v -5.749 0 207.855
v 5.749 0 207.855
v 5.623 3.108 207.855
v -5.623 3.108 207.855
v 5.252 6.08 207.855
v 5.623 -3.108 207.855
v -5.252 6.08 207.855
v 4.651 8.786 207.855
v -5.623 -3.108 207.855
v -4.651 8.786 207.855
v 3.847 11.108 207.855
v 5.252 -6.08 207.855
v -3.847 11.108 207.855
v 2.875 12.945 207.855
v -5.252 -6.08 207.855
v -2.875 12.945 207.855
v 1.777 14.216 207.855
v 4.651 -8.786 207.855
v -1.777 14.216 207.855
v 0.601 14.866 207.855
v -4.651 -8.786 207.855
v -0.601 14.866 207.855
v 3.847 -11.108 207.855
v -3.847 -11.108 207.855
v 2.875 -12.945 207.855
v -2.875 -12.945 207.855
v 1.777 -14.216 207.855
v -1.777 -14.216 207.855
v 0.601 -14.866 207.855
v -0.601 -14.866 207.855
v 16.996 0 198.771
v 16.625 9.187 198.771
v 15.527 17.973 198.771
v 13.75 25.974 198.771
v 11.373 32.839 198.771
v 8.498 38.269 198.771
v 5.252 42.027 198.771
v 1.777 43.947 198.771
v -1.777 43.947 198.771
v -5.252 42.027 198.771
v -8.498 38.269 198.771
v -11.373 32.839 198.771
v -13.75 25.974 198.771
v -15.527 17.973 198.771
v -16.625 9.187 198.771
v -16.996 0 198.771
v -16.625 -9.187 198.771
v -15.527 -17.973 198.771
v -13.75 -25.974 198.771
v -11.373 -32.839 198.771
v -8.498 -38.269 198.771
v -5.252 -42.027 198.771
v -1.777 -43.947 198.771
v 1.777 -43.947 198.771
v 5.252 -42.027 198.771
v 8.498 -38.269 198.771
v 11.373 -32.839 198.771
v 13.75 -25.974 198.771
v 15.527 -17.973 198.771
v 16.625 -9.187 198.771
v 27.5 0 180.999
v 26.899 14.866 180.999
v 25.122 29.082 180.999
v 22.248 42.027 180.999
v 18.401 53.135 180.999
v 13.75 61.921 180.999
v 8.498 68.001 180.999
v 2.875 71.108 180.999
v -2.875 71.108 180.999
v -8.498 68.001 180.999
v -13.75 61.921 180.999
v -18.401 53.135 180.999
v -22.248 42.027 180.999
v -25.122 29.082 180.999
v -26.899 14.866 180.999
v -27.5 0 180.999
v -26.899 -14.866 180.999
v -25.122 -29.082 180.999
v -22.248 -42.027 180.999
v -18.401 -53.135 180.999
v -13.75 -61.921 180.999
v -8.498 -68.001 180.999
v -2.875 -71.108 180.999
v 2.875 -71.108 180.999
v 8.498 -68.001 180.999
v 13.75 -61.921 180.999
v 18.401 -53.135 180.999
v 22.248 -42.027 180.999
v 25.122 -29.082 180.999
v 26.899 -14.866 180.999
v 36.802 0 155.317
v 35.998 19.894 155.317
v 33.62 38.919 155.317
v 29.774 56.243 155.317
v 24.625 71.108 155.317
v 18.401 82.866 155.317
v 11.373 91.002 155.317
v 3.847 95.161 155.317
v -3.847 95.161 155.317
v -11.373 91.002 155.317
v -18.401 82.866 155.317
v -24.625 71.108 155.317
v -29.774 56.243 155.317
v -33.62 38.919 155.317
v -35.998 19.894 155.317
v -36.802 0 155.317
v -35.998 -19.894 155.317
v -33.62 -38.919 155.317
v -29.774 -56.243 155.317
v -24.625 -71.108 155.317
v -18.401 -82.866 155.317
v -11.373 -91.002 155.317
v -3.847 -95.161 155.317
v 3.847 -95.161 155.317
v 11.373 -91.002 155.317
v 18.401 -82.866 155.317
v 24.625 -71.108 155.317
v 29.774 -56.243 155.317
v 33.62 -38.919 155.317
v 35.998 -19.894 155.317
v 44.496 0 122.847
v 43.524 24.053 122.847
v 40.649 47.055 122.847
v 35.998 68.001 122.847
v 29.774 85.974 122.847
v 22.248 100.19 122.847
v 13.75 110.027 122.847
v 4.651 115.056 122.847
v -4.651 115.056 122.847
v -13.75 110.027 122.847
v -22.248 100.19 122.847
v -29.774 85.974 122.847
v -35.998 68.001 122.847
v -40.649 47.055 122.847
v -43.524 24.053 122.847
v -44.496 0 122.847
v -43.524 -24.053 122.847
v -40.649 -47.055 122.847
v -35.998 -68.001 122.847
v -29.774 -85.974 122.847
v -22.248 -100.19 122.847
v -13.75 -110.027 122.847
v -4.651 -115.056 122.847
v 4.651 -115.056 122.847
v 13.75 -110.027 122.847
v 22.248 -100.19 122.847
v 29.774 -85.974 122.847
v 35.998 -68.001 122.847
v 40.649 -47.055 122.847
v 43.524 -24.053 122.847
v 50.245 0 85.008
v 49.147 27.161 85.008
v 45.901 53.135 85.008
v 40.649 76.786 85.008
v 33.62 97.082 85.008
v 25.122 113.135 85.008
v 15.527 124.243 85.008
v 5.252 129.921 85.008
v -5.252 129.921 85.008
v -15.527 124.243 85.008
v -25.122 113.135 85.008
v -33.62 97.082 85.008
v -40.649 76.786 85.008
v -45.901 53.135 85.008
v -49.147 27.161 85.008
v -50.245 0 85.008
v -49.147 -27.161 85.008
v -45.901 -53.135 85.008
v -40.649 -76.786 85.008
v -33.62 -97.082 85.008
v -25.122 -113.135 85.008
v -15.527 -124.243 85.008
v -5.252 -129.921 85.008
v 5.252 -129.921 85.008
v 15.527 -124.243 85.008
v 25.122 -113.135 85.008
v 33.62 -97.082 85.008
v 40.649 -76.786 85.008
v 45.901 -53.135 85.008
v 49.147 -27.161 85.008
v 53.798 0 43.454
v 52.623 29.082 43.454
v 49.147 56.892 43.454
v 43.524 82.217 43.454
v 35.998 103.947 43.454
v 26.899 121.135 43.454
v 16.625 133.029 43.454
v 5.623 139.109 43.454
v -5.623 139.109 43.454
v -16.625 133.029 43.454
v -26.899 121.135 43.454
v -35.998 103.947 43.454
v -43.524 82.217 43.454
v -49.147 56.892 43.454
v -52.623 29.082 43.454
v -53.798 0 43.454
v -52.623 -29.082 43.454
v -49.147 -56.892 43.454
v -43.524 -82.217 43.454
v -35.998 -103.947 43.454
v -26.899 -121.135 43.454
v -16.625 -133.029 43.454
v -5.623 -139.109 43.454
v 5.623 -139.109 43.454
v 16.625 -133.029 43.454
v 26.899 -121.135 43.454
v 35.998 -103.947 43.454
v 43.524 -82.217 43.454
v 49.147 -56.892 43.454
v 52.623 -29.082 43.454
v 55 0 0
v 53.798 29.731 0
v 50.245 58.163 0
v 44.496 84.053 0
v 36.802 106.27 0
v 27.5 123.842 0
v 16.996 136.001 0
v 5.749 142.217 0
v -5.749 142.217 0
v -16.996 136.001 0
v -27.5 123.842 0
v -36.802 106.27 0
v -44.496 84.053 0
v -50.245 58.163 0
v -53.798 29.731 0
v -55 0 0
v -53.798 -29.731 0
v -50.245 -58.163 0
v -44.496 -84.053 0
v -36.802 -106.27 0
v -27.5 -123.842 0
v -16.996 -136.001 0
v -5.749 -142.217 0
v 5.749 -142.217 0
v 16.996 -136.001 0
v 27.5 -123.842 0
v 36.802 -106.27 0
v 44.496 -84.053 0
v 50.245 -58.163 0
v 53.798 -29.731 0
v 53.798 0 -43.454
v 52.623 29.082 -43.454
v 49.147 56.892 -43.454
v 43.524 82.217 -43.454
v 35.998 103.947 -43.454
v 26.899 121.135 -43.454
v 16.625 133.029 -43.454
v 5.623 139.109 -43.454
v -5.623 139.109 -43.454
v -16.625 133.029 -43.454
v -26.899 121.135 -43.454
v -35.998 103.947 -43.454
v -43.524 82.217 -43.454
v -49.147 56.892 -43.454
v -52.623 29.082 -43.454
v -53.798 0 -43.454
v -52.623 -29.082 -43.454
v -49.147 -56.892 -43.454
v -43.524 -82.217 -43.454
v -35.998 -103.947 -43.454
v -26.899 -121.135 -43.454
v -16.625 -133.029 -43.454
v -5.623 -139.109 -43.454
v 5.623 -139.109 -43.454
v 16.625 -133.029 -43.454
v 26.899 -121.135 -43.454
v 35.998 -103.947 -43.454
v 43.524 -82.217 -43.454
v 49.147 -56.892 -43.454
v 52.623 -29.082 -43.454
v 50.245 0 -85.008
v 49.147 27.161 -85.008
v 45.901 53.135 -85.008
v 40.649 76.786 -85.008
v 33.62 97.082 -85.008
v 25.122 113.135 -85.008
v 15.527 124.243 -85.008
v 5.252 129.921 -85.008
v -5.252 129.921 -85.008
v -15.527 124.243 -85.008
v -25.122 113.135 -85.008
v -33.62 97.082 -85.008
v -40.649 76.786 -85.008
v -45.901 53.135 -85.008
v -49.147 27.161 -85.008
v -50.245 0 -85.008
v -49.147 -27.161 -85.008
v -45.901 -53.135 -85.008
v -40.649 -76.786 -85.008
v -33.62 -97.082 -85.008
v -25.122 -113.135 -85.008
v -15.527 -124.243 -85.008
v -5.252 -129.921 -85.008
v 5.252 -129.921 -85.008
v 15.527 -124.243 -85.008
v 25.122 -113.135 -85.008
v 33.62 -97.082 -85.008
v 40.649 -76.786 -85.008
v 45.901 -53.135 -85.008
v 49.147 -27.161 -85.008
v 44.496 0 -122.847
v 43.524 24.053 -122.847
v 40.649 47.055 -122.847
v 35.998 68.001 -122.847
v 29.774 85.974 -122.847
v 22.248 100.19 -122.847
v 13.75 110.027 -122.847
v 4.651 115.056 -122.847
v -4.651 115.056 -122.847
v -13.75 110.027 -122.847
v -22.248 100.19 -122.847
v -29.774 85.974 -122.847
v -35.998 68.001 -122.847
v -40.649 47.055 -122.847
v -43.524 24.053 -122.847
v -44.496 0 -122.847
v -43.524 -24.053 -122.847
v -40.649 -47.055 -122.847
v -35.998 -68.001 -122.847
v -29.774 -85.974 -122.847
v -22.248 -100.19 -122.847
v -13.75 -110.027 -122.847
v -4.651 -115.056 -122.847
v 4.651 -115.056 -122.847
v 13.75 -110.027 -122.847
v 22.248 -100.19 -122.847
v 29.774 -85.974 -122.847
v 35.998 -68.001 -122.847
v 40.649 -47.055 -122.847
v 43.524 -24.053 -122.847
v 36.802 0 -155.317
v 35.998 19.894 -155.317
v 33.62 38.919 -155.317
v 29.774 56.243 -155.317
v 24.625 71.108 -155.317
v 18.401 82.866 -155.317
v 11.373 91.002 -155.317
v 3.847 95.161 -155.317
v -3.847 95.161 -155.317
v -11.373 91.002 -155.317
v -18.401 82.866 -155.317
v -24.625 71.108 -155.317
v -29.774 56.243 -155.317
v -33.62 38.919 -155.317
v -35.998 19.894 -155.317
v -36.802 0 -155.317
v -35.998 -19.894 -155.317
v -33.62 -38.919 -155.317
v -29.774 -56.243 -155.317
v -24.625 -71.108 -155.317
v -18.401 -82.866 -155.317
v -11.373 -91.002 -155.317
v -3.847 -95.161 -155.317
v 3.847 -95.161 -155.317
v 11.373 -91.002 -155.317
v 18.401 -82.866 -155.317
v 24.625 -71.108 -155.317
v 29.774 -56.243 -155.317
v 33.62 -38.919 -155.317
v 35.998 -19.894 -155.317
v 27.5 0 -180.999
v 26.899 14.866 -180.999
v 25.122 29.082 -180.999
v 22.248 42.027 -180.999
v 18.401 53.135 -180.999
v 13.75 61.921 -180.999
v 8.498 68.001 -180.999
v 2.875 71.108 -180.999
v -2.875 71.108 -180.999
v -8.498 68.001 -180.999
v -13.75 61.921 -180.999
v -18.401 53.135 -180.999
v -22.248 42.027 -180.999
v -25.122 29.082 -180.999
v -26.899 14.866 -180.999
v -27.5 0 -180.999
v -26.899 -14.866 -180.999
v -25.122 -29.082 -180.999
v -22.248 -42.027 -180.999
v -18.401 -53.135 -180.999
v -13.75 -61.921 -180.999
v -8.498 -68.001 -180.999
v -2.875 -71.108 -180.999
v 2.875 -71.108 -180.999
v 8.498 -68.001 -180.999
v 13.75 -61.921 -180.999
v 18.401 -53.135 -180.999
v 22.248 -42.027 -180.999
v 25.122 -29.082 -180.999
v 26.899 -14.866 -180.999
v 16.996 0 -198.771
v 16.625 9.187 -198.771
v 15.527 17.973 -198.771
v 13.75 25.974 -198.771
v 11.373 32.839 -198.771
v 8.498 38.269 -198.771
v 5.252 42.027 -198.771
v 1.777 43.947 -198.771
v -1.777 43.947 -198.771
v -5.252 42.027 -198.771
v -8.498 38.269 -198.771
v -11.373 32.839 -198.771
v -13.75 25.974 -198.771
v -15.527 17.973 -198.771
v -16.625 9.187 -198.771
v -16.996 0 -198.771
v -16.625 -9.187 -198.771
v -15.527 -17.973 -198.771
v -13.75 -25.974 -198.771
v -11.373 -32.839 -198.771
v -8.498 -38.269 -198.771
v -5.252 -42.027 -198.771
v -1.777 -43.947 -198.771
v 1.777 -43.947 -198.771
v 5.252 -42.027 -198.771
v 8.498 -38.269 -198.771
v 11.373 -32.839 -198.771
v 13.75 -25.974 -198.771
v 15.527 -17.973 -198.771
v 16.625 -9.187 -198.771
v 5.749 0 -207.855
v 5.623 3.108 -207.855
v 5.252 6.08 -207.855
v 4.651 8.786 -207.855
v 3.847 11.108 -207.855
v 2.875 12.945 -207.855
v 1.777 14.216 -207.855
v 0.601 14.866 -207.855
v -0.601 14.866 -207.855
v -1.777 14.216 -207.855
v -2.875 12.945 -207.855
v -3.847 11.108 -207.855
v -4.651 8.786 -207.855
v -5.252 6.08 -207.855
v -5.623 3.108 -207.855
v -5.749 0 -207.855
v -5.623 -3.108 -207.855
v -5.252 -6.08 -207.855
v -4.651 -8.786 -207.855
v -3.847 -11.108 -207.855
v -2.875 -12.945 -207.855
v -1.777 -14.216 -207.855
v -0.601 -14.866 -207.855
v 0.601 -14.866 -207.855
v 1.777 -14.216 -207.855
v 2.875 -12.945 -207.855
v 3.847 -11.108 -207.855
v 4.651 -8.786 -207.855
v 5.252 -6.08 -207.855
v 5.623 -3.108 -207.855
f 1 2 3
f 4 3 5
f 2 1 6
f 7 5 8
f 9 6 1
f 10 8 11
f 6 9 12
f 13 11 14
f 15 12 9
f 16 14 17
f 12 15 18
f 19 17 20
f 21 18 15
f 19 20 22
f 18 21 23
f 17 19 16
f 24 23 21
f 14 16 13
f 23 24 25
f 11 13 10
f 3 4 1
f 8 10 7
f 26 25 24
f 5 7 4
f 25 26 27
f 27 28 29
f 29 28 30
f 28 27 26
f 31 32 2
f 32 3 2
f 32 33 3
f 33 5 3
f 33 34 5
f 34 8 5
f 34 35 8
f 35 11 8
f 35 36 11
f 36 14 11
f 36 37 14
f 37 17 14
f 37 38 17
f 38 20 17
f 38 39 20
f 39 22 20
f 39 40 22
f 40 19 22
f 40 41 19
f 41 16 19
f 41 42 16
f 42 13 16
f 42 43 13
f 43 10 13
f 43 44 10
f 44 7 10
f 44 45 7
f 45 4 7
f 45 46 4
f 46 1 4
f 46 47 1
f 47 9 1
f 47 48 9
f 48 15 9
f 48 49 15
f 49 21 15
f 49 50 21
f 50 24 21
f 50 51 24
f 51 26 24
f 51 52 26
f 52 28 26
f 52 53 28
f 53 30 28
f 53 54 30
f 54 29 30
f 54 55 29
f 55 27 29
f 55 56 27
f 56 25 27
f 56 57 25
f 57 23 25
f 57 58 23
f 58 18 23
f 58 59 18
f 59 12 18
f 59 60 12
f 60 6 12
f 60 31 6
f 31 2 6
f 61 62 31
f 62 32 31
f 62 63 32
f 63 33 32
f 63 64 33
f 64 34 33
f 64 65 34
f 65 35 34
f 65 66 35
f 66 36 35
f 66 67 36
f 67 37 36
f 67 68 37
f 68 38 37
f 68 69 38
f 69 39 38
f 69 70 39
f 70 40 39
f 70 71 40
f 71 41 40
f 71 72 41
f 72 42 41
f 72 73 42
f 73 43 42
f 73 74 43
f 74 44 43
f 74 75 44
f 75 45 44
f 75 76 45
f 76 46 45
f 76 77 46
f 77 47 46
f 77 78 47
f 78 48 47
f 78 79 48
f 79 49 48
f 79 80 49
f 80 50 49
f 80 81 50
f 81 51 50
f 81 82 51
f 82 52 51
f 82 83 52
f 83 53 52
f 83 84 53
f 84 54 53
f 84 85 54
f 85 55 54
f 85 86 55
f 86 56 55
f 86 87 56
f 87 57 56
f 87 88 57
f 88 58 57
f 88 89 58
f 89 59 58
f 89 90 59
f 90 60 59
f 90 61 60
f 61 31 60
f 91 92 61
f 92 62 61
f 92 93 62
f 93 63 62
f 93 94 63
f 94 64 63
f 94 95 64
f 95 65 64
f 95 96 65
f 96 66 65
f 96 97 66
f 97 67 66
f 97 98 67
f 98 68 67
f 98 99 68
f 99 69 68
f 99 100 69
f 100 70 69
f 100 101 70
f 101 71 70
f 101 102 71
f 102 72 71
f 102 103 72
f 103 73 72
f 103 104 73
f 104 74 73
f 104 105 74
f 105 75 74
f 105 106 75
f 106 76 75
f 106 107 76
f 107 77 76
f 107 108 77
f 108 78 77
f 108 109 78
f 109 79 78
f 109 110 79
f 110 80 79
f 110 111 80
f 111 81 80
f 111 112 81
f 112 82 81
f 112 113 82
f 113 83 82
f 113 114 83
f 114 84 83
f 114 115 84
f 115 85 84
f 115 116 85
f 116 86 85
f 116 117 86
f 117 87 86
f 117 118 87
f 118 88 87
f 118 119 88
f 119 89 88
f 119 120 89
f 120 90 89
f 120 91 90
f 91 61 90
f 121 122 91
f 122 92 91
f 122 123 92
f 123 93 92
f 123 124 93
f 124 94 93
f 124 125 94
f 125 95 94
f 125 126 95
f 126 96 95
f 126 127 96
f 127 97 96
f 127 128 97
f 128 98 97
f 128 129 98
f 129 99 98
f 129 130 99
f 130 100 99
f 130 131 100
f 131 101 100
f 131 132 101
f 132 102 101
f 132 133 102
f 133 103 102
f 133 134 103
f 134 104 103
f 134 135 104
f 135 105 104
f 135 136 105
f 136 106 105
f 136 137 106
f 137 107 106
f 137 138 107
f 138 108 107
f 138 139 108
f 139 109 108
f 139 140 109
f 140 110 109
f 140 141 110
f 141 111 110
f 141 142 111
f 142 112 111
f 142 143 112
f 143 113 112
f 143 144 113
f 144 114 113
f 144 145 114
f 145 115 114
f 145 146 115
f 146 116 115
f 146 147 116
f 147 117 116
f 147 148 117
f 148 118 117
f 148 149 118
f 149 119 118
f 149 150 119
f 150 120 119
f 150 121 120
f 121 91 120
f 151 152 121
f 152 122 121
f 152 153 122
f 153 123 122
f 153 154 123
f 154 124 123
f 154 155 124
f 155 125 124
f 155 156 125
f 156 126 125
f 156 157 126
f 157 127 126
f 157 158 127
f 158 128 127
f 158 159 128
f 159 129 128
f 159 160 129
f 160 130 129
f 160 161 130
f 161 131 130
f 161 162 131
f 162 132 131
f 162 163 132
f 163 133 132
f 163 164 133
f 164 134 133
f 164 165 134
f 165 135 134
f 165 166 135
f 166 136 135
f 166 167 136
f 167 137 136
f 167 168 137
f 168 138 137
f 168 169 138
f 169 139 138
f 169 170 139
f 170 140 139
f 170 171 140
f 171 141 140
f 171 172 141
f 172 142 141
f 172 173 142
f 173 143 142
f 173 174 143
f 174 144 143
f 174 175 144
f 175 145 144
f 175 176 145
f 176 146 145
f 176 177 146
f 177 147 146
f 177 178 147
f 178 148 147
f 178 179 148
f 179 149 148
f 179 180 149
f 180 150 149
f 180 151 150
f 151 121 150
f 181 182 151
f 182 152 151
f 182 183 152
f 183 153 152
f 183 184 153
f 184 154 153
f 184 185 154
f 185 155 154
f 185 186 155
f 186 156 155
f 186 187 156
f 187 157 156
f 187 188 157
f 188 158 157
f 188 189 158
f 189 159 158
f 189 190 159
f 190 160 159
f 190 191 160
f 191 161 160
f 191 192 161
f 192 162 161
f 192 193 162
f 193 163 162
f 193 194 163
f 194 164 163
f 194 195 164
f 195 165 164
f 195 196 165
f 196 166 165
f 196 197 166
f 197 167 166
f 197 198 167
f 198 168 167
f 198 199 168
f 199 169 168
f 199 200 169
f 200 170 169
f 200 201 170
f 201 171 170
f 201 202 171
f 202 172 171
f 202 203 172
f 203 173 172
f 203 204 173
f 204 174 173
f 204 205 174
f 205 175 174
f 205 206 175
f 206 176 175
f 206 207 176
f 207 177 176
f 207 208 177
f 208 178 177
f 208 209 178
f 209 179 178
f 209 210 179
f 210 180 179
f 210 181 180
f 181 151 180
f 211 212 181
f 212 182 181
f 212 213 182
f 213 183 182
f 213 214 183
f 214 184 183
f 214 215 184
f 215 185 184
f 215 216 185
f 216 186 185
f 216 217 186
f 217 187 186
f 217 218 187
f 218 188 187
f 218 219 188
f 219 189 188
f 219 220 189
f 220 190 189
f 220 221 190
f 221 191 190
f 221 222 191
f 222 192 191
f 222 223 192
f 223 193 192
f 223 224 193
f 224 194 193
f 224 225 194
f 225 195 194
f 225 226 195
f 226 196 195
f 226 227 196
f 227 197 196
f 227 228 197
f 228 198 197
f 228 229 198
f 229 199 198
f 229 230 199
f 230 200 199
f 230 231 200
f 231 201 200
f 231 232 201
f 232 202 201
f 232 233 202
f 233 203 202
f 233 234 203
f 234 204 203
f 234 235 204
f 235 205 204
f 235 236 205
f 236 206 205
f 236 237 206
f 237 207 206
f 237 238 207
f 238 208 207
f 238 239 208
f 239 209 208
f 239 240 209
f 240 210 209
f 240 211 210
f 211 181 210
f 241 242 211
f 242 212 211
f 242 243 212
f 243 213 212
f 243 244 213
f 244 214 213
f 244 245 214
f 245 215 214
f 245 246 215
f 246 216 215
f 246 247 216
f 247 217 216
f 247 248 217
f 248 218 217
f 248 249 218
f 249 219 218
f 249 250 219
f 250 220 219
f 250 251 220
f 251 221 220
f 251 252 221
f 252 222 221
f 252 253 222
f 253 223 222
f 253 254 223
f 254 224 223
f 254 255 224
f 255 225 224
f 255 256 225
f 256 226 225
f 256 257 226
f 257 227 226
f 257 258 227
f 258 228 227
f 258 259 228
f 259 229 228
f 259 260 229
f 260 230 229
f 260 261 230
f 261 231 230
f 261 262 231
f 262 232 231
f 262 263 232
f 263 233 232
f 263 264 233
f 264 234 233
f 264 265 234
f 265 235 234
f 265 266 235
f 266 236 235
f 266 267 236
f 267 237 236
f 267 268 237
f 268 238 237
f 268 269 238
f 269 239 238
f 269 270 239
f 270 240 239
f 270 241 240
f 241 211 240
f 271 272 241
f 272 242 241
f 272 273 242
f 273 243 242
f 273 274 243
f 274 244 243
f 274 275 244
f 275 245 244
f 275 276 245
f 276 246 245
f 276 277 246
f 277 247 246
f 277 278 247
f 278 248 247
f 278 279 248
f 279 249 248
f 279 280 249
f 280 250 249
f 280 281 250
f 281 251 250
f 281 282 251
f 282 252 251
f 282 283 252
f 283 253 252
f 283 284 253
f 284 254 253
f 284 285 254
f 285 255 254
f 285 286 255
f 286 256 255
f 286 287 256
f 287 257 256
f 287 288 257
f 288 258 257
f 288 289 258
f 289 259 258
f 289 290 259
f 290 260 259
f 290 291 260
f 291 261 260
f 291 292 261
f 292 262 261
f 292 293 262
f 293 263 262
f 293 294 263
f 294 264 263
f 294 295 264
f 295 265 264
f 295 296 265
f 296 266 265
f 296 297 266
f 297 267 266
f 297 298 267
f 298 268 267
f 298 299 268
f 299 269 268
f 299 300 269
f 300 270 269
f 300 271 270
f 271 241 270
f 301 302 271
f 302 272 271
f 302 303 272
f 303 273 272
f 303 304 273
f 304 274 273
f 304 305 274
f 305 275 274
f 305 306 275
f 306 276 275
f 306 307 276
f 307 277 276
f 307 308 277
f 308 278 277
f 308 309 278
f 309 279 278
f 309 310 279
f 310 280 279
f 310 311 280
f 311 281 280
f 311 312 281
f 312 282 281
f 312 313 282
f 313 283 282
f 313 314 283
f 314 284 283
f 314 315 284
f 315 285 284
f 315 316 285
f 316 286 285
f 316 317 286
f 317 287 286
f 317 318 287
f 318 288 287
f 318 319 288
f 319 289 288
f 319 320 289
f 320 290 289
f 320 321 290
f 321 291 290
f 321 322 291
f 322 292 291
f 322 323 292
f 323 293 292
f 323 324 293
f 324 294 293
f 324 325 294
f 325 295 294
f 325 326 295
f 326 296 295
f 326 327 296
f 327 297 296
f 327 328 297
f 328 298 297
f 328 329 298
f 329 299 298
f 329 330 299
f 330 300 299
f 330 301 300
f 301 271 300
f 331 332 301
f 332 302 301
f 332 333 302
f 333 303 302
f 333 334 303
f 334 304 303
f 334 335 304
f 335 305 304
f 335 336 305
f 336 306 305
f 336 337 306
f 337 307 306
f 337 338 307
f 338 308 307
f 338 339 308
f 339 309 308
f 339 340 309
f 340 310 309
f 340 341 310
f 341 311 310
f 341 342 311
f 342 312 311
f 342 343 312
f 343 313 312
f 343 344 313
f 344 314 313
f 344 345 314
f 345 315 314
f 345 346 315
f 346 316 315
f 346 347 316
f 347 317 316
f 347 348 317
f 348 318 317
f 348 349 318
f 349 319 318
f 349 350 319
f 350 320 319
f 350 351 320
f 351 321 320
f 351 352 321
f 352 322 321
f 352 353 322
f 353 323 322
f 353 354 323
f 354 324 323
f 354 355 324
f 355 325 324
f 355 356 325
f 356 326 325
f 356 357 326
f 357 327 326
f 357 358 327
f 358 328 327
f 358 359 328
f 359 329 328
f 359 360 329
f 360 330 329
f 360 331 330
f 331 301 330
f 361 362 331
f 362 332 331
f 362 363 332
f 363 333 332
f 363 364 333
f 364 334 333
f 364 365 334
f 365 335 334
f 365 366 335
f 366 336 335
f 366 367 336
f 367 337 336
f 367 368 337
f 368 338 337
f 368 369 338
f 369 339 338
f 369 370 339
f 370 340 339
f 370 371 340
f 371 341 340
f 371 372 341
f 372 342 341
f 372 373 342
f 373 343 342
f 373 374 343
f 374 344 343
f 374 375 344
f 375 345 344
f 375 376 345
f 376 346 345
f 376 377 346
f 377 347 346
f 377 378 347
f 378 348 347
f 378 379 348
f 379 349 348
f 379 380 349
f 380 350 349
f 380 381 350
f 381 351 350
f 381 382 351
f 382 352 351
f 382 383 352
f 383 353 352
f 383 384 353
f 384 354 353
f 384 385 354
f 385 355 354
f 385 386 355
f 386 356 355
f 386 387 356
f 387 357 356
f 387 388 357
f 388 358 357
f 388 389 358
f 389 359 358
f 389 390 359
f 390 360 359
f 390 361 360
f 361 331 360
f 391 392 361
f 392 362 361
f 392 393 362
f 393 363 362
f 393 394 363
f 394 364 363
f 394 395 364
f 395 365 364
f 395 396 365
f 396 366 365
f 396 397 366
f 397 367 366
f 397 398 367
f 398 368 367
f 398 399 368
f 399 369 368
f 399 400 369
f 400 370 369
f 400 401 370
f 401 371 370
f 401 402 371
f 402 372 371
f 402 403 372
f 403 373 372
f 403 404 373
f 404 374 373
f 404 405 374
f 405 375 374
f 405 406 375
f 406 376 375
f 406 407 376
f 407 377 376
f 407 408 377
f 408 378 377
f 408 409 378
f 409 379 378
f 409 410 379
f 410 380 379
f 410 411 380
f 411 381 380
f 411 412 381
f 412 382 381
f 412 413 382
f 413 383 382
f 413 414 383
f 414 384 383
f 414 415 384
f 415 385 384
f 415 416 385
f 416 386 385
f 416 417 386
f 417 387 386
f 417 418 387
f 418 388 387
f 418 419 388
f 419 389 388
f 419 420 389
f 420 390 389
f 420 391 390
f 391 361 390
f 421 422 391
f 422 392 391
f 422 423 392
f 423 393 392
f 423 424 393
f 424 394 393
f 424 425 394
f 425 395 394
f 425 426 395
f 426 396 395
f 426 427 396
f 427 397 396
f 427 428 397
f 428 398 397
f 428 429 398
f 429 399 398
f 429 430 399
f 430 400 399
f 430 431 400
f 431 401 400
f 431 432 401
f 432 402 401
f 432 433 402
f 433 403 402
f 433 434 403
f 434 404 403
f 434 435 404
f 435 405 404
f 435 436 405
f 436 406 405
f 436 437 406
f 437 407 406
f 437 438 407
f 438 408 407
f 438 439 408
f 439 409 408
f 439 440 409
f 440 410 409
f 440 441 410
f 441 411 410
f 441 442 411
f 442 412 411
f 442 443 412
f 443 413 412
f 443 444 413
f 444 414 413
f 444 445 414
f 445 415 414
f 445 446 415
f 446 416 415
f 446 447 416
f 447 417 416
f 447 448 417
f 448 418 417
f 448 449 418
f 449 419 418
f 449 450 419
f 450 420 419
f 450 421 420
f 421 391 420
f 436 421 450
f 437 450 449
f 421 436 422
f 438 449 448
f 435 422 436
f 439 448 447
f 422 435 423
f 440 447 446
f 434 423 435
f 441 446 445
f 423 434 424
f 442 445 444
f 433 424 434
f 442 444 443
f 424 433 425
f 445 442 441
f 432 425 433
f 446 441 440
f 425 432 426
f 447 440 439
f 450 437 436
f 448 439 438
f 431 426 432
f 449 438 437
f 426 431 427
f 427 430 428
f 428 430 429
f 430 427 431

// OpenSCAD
// Generated by SolidPython 1.0.1 on 2020-07-29 00:46:46


scale(v = [5, 13, 19]) {
	sphere(r = 11);
}
/***********************************************
*********      SolidPython code:      **********
************************************************
 
# import packages: SolidPython
from solid import *
from solid.utils import *
from itertools import chain, combinations, permutations


class Resize:

    def __init__(self, scad_file):
        self.scad_file = scad_file
        #self.scad_file = import_scad(scad_file)
        # cone/cylinder param:
        self.r1 = 0
        self.r2 = 0
        self.h = 0
        # rectangular prism param:
        self.w = 0
        self.l = 0
        # ellipse param:
        self.r = 0

    # import OpenScad code (file name corresponds to shape)


    # classify shape + parameters
    def assign(self, param1, param2, param3):
        if self.scad_file == 'cone.scad':
            self.r1 = param1
            self.r2 = param2
            self.h = param3
        elif self.scad_file == 'cylinder.scad':
            self.r1 = param1
            self.r2 = param2
            self.h = param3
        elif self.scad_file == 'rectangularPrism.scad':
            self.h = param1
            self.l = param2
            self.w = param3
        else:
            self.r = param1
            self.h = param2

    # resize parameters
    def iterate(self):
        x = range(3, 20, 2)
        i = 1
        if self.scad_file == 'cone.scad':
            tempList = list(permutations(x, 2))
            for temp in tempList:
                param1 = temp[0]
                param2 = temp[1]
                filepath = 'produced_scad_files/' + 'cone' + str(param1) + '_' + str(param2) + '_' + '.scad'
                scad_render_to_file(cylinder(h=param1, r1=param2, r2=0), filepath)

        elif self.scad_file == 'cylinder.scad':
            tempList = list(permutations(x, 3))
            for temp in tempList:
                param1 = temp[0]
                param2 = temp[1]
                filepath = 'produced_scad_files/' + 'cylinder' + str(param1) + '_' + str(param2) + '_' + '.scad'
                scad_render_to_file(cylinder(h=param1, r1=param2, r2=param2), filepath)

        elif self.scad_file == 'rectangularPrism.scad':
            tempList = list(permutations(x, 3))
            for temp in tempList:
                param1 = temp[0]
                param2 = temp[1]
                param3 = temp[2]
                filepath = 'produced_scad_files/' + 'rectangularPrism' + str(param1) + '_' + str(param2) + '_' + str(
                    param3) + '.scad'
                scad_render_to_file(cube(size=(param1, param2, param3)), filepath)

        elif self.scad_file == 'ellipse.scad':
            tempList = list(permutations(x, 4))
            for temp in tempList:
                param1 = temp[0]
                param2 = temp[1]
                param3 = temp[2]
                param4 = temp[3]
                filepath = 'produced_scad_files/' + 'ellipse' + str(param1) + '_' + str(param2) + '_' + str(param3) + '_' + str(param4) + '.scad'
                scad_render_to_file(scale([param1, param2, param3])(sphere(r=param4)), filepath)

    def render_to_scadfile(self):
        scad_render_to_file(scad, 'example.scad') 
 
************************************************/
